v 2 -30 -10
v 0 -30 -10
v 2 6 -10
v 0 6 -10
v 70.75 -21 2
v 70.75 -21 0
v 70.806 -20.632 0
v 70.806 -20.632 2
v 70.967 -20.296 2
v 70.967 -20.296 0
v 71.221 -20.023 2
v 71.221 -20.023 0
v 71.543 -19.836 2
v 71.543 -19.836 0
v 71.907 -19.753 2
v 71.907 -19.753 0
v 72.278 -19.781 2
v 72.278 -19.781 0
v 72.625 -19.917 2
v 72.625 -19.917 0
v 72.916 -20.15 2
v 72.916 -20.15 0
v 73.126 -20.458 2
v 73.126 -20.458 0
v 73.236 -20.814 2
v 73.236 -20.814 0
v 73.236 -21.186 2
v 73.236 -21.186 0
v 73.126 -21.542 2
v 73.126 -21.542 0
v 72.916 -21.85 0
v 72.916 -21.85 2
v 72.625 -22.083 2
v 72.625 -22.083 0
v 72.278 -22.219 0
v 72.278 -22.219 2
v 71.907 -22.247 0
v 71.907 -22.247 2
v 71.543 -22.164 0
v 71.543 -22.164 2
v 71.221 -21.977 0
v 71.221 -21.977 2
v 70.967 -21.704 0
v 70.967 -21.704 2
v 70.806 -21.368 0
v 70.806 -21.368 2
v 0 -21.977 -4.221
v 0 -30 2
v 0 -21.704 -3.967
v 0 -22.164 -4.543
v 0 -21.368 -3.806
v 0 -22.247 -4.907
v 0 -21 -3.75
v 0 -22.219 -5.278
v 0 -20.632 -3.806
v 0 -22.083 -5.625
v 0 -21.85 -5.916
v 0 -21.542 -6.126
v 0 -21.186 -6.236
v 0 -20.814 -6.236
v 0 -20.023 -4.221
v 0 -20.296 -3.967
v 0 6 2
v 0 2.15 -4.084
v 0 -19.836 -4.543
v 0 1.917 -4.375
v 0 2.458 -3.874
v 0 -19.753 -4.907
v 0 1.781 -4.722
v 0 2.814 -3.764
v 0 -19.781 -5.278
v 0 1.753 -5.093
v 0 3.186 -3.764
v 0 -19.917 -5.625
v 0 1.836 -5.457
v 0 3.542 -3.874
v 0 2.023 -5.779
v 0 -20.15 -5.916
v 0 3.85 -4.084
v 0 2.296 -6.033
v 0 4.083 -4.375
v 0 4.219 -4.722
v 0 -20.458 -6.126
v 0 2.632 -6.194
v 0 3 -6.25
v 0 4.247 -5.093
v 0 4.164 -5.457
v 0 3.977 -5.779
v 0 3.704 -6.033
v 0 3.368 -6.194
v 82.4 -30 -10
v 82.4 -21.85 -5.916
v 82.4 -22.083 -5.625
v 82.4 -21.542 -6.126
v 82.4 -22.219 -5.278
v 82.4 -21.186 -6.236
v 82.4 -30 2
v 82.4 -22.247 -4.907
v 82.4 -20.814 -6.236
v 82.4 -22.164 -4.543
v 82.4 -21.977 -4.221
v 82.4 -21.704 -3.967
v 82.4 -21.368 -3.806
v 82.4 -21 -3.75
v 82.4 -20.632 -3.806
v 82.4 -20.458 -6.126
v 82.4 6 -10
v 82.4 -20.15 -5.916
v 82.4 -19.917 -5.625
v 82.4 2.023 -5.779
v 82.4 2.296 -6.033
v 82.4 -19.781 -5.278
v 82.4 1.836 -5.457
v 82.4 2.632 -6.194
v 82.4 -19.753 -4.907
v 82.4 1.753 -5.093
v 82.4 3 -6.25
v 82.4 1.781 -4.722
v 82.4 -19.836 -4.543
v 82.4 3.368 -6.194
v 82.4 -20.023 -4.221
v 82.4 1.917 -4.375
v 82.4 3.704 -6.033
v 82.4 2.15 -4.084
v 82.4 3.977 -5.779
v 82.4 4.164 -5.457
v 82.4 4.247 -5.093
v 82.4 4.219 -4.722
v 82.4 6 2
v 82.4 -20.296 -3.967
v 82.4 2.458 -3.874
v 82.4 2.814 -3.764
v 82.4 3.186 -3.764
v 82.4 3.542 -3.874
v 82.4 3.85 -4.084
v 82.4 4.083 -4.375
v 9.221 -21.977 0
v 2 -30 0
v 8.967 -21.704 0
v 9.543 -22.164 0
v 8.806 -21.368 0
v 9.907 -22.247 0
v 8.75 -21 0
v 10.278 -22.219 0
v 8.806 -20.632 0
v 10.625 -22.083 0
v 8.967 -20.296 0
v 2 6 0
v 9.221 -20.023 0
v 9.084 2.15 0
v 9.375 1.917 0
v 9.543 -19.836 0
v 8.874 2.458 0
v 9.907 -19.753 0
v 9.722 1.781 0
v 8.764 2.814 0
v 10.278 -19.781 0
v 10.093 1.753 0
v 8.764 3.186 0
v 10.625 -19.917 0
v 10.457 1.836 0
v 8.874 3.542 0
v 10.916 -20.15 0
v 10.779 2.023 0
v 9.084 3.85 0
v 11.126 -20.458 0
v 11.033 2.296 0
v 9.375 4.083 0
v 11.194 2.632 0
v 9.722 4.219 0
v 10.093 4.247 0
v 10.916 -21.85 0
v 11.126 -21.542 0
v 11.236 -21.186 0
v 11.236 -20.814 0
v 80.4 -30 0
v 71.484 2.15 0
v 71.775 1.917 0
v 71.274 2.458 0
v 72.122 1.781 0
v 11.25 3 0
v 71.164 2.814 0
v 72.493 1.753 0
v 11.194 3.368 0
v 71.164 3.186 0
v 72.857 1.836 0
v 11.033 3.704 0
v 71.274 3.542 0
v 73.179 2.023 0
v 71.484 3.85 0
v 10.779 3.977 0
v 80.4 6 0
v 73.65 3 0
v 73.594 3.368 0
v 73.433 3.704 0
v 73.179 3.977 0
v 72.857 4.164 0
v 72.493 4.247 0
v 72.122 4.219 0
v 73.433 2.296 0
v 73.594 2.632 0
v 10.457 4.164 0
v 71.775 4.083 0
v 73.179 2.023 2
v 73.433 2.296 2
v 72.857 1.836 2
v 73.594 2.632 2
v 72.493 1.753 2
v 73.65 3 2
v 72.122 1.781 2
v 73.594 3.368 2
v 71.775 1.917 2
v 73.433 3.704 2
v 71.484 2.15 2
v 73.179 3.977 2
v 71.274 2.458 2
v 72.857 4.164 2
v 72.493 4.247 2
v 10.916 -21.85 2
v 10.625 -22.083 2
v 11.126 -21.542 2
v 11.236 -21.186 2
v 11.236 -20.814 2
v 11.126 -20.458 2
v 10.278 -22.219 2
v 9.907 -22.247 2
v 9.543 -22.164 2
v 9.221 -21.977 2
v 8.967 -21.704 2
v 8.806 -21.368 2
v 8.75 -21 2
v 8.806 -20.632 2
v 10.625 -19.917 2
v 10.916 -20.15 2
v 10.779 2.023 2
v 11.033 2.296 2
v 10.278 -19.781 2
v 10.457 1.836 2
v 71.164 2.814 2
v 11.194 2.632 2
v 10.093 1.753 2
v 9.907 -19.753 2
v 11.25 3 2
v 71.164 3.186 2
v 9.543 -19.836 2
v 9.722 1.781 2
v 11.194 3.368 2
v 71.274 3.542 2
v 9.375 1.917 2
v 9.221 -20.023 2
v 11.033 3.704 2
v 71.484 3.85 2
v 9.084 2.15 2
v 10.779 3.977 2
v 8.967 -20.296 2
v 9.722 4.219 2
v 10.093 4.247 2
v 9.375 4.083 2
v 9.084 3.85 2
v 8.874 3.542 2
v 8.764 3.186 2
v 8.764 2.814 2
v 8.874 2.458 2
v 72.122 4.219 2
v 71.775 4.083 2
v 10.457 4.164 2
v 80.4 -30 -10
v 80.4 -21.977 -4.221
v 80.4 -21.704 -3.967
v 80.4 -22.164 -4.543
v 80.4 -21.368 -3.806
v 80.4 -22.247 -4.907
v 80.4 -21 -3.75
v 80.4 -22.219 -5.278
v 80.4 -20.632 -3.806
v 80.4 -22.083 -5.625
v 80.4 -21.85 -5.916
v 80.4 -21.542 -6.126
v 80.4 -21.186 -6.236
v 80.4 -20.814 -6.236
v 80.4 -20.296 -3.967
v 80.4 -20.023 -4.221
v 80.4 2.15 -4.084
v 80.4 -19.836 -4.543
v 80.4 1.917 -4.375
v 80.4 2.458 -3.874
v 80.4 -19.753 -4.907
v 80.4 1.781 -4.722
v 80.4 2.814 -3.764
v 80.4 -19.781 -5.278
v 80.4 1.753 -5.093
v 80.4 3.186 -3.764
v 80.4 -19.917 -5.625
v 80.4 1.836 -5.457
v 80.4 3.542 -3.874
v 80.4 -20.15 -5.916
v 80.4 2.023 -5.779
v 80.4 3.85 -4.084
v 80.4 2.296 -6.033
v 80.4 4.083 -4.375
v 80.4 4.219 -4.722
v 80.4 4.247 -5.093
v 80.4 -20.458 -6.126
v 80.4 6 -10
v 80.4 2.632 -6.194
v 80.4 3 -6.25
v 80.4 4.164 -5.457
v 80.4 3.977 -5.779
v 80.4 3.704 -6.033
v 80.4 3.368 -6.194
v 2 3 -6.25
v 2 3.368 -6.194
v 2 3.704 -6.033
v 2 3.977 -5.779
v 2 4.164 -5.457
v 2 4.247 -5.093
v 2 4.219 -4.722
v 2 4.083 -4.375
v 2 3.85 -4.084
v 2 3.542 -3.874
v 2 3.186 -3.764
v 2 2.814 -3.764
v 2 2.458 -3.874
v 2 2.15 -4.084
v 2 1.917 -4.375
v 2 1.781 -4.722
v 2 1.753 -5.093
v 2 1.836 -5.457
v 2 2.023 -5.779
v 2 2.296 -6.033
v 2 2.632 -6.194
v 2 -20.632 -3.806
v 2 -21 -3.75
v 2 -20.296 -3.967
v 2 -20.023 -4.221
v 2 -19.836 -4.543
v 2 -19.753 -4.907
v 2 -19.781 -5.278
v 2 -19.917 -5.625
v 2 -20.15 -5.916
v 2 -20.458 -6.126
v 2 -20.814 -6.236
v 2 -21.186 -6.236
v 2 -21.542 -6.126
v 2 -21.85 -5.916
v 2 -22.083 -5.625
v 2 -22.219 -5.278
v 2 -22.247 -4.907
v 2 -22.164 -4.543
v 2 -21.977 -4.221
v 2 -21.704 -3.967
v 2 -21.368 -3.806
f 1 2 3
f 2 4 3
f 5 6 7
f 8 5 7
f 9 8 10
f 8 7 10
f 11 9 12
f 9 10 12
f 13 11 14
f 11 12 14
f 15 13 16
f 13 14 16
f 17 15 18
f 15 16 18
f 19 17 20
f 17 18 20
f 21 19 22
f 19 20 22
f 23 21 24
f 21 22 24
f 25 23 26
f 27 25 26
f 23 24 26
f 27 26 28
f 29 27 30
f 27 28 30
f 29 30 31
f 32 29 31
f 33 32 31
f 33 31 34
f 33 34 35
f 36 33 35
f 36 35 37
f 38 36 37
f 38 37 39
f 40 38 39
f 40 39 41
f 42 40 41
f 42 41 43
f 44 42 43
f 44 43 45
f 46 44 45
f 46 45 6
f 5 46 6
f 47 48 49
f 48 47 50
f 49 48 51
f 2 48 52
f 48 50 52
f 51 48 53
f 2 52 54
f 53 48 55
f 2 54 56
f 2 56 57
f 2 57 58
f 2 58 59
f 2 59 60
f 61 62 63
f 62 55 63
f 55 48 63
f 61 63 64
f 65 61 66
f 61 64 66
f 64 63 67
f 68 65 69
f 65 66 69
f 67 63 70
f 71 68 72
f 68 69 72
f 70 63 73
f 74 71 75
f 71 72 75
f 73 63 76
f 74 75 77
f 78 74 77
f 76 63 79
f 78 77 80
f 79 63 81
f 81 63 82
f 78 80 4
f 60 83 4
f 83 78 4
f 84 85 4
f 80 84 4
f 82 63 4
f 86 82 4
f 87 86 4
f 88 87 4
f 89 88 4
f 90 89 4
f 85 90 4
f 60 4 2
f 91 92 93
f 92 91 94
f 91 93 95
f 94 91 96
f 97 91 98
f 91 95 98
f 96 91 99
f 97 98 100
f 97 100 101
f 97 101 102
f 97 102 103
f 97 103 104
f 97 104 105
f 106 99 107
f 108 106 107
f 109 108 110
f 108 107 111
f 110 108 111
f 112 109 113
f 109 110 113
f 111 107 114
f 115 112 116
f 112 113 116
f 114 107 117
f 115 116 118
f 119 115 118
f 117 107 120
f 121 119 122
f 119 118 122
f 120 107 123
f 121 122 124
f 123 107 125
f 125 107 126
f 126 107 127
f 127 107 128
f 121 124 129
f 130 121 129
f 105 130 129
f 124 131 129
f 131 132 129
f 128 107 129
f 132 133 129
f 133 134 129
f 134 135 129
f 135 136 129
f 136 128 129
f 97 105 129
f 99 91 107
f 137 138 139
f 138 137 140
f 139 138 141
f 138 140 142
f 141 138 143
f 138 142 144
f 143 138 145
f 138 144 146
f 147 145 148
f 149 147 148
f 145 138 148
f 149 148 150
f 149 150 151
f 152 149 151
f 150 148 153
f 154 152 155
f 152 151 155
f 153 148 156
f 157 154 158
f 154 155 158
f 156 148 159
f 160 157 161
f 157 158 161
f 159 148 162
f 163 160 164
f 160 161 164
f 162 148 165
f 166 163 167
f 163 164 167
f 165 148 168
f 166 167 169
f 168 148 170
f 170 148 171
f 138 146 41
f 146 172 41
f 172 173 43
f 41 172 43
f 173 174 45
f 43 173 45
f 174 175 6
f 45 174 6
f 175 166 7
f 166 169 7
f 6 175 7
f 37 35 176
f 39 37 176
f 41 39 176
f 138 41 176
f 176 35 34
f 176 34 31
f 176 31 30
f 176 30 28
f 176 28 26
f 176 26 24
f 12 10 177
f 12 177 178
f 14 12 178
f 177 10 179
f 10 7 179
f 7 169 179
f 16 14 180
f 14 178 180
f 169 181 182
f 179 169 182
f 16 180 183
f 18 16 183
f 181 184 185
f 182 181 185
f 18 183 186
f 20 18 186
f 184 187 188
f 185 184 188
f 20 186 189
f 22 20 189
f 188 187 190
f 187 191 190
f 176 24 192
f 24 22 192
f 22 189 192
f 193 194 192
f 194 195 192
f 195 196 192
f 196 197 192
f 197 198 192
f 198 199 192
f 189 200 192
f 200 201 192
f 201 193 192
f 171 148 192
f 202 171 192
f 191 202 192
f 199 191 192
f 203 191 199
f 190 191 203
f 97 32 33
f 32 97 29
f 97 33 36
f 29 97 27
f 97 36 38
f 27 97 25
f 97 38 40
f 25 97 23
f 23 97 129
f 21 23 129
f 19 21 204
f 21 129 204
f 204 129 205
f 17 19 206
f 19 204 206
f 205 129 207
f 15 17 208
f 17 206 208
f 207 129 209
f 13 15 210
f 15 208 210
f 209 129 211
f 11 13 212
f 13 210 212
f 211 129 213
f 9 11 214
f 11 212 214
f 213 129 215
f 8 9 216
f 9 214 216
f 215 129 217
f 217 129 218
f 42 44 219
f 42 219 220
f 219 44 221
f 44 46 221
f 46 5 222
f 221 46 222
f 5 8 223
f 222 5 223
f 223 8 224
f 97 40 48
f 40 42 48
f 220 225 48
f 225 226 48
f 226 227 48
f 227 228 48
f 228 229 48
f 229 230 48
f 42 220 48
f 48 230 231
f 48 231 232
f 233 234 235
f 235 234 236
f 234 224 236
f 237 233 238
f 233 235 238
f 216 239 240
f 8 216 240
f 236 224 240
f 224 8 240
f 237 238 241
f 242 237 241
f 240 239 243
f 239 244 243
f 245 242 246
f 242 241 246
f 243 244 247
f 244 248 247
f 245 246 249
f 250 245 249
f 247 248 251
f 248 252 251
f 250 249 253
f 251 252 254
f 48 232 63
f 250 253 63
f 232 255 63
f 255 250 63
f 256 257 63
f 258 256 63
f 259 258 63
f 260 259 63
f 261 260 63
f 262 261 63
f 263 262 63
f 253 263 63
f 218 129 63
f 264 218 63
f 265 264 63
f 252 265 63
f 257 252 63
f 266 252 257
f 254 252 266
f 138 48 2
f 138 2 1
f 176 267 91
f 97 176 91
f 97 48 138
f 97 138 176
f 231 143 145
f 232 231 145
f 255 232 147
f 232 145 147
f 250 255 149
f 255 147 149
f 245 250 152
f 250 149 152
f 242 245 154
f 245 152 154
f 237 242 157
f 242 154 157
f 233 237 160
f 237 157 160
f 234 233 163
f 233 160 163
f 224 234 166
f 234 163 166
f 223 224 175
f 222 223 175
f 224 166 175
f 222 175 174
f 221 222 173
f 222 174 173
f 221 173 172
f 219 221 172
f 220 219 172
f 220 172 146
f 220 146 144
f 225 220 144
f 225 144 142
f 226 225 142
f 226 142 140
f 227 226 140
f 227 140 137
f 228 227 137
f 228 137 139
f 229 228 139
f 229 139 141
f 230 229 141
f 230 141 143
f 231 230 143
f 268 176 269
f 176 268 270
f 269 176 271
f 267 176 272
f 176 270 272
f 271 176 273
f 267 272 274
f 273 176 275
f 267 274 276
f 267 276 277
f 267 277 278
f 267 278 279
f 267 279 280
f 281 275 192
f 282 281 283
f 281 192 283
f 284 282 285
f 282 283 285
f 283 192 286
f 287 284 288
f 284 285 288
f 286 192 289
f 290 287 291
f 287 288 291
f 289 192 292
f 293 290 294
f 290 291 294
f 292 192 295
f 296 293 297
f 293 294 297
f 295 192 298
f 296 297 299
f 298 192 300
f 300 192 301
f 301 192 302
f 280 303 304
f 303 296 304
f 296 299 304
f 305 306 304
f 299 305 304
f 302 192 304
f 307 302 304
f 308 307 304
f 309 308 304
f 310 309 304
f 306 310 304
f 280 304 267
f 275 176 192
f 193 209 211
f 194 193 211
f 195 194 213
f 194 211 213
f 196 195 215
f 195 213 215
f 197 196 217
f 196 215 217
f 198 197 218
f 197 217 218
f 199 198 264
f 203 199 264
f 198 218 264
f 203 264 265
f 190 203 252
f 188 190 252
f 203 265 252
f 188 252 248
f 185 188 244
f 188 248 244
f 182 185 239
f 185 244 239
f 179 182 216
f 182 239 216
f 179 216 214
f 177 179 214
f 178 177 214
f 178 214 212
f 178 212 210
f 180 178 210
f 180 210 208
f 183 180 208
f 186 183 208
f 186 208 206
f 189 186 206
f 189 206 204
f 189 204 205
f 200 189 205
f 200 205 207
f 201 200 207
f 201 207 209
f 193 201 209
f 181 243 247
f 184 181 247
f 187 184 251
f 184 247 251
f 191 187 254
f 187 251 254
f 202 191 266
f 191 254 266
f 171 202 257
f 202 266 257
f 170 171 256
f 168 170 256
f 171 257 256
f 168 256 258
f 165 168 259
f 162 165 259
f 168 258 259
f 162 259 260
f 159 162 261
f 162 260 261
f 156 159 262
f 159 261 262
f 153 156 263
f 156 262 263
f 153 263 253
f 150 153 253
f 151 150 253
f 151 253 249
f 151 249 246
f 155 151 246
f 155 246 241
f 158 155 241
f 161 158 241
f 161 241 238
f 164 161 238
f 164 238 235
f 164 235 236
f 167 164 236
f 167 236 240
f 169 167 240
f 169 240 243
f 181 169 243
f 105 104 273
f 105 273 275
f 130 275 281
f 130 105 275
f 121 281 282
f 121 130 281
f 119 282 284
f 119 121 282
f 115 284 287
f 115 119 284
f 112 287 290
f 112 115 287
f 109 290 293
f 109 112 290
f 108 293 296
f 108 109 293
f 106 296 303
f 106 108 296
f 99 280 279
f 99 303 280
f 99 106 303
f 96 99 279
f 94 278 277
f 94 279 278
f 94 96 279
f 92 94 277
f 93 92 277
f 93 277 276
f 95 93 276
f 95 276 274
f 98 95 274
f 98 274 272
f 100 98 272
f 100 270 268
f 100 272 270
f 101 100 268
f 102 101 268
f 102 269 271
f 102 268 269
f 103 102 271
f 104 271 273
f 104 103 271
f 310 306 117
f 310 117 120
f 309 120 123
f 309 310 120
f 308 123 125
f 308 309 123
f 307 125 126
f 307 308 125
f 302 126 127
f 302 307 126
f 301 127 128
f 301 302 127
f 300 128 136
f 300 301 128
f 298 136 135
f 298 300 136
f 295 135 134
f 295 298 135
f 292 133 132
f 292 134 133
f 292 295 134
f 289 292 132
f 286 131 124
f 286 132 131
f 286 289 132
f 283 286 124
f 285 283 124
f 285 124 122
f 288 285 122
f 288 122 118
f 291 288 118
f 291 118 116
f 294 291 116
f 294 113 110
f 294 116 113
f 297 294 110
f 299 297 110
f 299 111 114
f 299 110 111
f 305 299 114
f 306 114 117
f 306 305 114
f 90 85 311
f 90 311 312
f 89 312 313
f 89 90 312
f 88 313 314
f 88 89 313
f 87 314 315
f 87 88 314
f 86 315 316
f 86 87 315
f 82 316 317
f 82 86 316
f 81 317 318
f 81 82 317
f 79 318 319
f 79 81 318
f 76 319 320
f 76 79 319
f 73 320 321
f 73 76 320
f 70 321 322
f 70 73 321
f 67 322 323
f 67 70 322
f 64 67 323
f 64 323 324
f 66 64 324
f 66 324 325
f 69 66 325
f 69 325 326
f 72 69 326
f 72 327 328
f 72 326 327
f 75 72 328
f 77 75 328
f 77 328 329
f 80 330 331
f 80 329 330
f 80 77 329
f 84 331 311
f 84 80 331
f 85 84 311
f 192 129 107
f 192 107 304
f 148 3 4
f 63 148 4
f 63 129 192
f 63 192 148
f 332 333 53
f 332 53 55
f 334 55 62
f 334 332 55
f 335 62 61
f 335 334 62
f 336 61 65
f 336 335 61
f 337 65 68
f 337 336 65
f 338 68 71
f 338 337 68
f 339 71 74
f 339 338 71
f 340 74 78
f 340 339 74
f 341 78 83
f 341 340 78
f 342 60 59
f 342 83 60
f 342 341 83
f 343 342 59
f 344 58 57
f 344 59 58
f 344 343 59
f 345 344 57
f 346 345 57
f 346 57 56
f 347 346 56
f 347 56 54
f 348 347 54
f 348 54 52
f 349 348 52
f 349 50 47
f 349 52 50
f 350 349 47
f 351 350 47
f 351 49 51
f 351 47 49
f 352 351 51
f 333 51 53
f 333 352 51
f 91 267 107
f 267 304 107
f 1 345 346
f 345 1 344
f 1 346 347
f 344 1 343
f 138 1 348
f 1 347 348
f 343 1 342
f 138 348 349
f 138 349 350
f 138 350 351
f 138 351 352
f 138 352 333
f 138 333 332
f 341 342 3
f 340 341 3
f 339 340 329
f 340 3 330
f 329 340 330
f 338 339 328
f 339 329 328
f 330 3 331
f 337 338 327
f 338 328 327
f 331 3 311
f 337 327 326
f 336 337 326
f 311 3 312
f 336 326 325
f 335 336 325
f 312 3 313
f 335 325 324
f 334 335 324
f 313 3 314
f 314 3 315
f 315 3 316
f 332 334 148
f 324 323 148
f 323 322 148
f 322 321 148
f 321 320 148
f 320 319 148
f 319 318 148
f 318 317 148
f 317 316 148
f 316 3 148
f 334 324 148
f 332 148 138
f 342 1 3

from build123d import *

# Parameters (mm, degrees)
SKETCH_1_W               = 82.4
SKETCH_1_H               = 6
EXTRUDE_1_DEPTH          = 2
SKETCH_2_W               = 2
SKETCH_2_H               = 6
EXTRUDE_2_DEPTH          = 10
CUT_EXTRUDE_1_REACH      = 85.485
SKETCH_3_R               = 1.25
CUT_EXTRUDE_2_DEPTH      = 84.221151158
CUT_EXTRUDE_2_DEPTH_BACK = 84.221151158
SKETCH_4_R               = 1.25
EXTRUDE_3_DEPTH          = 30
CUT_EXTRUDE_3_DEPTH      = 87.395370246
CUT_EXTRUDE_3_DEPTH_BACK = 87.395370246
SKETCH_9_R               = 1.25
SKETCH_10_R              = 1.25
CUT_EXTRUDE_4_DEPTH      = 89.25961704


with BuildPart() as part:
    # 草图1 → 凸台-拉伸1 (new body)
    with BuildSketch(Plane.XY):
        with Locations((41.2, 3)):
            Rectangle(SKETCH_1_W, SKETCH_1_H)
    extrude(amount=EXTRUDE_1_DEPTH)

    # 草图2 → 凸台-拉伸2 (add)
    with BuildSketch(Plane(origin=(0, 0, 0), x_dir=(-1, 0, 0), z_dir=(0, 0, -1))):
        with Locations((-1, 3)):
            Rectangle(SKETCH_2_W, SKETCH_2_H)
        with Locations((-81.4, 3)):
            Rectangle(SKETCH_2_W, SKETCH_2_H)
    extrude(amount=EXTRUDE_2_DEPTH)

    # 草图3 → 切除-拉伸1 (cut, up to next)
    with BuildSketch(Plane.XY.offset(2), mode=Mode.PRIVATE) as cut_extrude_1_sk1:
        with Locations((10, 3)):
            Circle(SKETCH_3_R)
    cut_extrude_1_tool1 = extrude(cut_extrude_1_sk1.sketch, amount=-CUT_EXTRUDE_1_REACH, mode=Mode.PRIVATE) & part.part
    # 草图3 → 切除-拉伸1 (cut, up to next)
    with BuildSketch(Plane.XY.offset(2), mode=Mode.PRIVATE) as cut_extrude_1_sk2:
        with Locations((72.4, 3)):
            Circle(SKETCH_3_R)
    cut_extrude_1_tool2 = extrude(cut_extrude_1_sk2.sketch, amount=-CUT_EXTRUDE_1_REACH, mode=Mode.PRIVATE) & part.part
    add(cut_extrude_1_tool1.solids().sort_by_distance((10, 3, 2))[0], mode=Mode.SUBTRACT)
    add(cut_extrude_1_tool2.solids().sort_by_distance((72.4, 3, 2))[0], mode=Mode.SUBTRACT)

    # 草图4 → 切除-拉伸2 (cut, two sides: drawn at the far end of the back side and taken through both)
    with BuildSketch(Plane(origin=(82.4, 0, 0), x_dir=(0, 0, -1), z_dir=(1, 0, 0)).offset(-CUT_EXTRUDE_2_DEPTH_BACK)):
        with Locations((5, 3)):
            Circle(SKETCH_4_R)
    extrude(amount=CUT_EXTRUDE_2_DEPTH + CUT_EXTRUDE_2_DEPTH_BACK, mode=Mode.SUBTRACT)

    # 草图5 → 凸台-拉伸3 (add)
    with BuildSketch(Plane.XZ):
        Polygon((0, 2), (0, -10), (2, -10), (2, 0), (80.4, 0), (80.4, -10), (82.4, -10), (82.4, 2), align=None)
    extrude(amount=EXTRUDE_3_DEPTH)

    # 草图9 → 切除-拉伸3 (cut, two sides: drawn at the far end of the back side and taken through both)
    with BuildSketch(Plane.ZY.offset(-80.4).offset(-CUT_EXTRUDE_3_DEPTH_BACK)):
        with Locations((-5, -21)):
            Circle(SKETCH_9_R)
    extrude(amount=CUT_EXTRUDE_3_DEPTH + CUT_EXTRUDE_3_DEPTH_BACK, mode=Mode.SUBTRACT)

    # 草图10 → 切除-拉伸4 (cut, through all)
    with BuildSketch(Plane(origin=(0, 0, 0), x_dir=(-1, 0, 0), z_dir=(0, 0, -1))):
        with Locations((-10, -21)):
            Circle(SKETCH_10_R)
        with Locations((-72, -21)):
            Circle(SKETCH_10_R)
    extrude(amount=-CUT_EXTRUDE_4_DEPTH, mode=Mode.SUBTRACT)


solid = part.part
